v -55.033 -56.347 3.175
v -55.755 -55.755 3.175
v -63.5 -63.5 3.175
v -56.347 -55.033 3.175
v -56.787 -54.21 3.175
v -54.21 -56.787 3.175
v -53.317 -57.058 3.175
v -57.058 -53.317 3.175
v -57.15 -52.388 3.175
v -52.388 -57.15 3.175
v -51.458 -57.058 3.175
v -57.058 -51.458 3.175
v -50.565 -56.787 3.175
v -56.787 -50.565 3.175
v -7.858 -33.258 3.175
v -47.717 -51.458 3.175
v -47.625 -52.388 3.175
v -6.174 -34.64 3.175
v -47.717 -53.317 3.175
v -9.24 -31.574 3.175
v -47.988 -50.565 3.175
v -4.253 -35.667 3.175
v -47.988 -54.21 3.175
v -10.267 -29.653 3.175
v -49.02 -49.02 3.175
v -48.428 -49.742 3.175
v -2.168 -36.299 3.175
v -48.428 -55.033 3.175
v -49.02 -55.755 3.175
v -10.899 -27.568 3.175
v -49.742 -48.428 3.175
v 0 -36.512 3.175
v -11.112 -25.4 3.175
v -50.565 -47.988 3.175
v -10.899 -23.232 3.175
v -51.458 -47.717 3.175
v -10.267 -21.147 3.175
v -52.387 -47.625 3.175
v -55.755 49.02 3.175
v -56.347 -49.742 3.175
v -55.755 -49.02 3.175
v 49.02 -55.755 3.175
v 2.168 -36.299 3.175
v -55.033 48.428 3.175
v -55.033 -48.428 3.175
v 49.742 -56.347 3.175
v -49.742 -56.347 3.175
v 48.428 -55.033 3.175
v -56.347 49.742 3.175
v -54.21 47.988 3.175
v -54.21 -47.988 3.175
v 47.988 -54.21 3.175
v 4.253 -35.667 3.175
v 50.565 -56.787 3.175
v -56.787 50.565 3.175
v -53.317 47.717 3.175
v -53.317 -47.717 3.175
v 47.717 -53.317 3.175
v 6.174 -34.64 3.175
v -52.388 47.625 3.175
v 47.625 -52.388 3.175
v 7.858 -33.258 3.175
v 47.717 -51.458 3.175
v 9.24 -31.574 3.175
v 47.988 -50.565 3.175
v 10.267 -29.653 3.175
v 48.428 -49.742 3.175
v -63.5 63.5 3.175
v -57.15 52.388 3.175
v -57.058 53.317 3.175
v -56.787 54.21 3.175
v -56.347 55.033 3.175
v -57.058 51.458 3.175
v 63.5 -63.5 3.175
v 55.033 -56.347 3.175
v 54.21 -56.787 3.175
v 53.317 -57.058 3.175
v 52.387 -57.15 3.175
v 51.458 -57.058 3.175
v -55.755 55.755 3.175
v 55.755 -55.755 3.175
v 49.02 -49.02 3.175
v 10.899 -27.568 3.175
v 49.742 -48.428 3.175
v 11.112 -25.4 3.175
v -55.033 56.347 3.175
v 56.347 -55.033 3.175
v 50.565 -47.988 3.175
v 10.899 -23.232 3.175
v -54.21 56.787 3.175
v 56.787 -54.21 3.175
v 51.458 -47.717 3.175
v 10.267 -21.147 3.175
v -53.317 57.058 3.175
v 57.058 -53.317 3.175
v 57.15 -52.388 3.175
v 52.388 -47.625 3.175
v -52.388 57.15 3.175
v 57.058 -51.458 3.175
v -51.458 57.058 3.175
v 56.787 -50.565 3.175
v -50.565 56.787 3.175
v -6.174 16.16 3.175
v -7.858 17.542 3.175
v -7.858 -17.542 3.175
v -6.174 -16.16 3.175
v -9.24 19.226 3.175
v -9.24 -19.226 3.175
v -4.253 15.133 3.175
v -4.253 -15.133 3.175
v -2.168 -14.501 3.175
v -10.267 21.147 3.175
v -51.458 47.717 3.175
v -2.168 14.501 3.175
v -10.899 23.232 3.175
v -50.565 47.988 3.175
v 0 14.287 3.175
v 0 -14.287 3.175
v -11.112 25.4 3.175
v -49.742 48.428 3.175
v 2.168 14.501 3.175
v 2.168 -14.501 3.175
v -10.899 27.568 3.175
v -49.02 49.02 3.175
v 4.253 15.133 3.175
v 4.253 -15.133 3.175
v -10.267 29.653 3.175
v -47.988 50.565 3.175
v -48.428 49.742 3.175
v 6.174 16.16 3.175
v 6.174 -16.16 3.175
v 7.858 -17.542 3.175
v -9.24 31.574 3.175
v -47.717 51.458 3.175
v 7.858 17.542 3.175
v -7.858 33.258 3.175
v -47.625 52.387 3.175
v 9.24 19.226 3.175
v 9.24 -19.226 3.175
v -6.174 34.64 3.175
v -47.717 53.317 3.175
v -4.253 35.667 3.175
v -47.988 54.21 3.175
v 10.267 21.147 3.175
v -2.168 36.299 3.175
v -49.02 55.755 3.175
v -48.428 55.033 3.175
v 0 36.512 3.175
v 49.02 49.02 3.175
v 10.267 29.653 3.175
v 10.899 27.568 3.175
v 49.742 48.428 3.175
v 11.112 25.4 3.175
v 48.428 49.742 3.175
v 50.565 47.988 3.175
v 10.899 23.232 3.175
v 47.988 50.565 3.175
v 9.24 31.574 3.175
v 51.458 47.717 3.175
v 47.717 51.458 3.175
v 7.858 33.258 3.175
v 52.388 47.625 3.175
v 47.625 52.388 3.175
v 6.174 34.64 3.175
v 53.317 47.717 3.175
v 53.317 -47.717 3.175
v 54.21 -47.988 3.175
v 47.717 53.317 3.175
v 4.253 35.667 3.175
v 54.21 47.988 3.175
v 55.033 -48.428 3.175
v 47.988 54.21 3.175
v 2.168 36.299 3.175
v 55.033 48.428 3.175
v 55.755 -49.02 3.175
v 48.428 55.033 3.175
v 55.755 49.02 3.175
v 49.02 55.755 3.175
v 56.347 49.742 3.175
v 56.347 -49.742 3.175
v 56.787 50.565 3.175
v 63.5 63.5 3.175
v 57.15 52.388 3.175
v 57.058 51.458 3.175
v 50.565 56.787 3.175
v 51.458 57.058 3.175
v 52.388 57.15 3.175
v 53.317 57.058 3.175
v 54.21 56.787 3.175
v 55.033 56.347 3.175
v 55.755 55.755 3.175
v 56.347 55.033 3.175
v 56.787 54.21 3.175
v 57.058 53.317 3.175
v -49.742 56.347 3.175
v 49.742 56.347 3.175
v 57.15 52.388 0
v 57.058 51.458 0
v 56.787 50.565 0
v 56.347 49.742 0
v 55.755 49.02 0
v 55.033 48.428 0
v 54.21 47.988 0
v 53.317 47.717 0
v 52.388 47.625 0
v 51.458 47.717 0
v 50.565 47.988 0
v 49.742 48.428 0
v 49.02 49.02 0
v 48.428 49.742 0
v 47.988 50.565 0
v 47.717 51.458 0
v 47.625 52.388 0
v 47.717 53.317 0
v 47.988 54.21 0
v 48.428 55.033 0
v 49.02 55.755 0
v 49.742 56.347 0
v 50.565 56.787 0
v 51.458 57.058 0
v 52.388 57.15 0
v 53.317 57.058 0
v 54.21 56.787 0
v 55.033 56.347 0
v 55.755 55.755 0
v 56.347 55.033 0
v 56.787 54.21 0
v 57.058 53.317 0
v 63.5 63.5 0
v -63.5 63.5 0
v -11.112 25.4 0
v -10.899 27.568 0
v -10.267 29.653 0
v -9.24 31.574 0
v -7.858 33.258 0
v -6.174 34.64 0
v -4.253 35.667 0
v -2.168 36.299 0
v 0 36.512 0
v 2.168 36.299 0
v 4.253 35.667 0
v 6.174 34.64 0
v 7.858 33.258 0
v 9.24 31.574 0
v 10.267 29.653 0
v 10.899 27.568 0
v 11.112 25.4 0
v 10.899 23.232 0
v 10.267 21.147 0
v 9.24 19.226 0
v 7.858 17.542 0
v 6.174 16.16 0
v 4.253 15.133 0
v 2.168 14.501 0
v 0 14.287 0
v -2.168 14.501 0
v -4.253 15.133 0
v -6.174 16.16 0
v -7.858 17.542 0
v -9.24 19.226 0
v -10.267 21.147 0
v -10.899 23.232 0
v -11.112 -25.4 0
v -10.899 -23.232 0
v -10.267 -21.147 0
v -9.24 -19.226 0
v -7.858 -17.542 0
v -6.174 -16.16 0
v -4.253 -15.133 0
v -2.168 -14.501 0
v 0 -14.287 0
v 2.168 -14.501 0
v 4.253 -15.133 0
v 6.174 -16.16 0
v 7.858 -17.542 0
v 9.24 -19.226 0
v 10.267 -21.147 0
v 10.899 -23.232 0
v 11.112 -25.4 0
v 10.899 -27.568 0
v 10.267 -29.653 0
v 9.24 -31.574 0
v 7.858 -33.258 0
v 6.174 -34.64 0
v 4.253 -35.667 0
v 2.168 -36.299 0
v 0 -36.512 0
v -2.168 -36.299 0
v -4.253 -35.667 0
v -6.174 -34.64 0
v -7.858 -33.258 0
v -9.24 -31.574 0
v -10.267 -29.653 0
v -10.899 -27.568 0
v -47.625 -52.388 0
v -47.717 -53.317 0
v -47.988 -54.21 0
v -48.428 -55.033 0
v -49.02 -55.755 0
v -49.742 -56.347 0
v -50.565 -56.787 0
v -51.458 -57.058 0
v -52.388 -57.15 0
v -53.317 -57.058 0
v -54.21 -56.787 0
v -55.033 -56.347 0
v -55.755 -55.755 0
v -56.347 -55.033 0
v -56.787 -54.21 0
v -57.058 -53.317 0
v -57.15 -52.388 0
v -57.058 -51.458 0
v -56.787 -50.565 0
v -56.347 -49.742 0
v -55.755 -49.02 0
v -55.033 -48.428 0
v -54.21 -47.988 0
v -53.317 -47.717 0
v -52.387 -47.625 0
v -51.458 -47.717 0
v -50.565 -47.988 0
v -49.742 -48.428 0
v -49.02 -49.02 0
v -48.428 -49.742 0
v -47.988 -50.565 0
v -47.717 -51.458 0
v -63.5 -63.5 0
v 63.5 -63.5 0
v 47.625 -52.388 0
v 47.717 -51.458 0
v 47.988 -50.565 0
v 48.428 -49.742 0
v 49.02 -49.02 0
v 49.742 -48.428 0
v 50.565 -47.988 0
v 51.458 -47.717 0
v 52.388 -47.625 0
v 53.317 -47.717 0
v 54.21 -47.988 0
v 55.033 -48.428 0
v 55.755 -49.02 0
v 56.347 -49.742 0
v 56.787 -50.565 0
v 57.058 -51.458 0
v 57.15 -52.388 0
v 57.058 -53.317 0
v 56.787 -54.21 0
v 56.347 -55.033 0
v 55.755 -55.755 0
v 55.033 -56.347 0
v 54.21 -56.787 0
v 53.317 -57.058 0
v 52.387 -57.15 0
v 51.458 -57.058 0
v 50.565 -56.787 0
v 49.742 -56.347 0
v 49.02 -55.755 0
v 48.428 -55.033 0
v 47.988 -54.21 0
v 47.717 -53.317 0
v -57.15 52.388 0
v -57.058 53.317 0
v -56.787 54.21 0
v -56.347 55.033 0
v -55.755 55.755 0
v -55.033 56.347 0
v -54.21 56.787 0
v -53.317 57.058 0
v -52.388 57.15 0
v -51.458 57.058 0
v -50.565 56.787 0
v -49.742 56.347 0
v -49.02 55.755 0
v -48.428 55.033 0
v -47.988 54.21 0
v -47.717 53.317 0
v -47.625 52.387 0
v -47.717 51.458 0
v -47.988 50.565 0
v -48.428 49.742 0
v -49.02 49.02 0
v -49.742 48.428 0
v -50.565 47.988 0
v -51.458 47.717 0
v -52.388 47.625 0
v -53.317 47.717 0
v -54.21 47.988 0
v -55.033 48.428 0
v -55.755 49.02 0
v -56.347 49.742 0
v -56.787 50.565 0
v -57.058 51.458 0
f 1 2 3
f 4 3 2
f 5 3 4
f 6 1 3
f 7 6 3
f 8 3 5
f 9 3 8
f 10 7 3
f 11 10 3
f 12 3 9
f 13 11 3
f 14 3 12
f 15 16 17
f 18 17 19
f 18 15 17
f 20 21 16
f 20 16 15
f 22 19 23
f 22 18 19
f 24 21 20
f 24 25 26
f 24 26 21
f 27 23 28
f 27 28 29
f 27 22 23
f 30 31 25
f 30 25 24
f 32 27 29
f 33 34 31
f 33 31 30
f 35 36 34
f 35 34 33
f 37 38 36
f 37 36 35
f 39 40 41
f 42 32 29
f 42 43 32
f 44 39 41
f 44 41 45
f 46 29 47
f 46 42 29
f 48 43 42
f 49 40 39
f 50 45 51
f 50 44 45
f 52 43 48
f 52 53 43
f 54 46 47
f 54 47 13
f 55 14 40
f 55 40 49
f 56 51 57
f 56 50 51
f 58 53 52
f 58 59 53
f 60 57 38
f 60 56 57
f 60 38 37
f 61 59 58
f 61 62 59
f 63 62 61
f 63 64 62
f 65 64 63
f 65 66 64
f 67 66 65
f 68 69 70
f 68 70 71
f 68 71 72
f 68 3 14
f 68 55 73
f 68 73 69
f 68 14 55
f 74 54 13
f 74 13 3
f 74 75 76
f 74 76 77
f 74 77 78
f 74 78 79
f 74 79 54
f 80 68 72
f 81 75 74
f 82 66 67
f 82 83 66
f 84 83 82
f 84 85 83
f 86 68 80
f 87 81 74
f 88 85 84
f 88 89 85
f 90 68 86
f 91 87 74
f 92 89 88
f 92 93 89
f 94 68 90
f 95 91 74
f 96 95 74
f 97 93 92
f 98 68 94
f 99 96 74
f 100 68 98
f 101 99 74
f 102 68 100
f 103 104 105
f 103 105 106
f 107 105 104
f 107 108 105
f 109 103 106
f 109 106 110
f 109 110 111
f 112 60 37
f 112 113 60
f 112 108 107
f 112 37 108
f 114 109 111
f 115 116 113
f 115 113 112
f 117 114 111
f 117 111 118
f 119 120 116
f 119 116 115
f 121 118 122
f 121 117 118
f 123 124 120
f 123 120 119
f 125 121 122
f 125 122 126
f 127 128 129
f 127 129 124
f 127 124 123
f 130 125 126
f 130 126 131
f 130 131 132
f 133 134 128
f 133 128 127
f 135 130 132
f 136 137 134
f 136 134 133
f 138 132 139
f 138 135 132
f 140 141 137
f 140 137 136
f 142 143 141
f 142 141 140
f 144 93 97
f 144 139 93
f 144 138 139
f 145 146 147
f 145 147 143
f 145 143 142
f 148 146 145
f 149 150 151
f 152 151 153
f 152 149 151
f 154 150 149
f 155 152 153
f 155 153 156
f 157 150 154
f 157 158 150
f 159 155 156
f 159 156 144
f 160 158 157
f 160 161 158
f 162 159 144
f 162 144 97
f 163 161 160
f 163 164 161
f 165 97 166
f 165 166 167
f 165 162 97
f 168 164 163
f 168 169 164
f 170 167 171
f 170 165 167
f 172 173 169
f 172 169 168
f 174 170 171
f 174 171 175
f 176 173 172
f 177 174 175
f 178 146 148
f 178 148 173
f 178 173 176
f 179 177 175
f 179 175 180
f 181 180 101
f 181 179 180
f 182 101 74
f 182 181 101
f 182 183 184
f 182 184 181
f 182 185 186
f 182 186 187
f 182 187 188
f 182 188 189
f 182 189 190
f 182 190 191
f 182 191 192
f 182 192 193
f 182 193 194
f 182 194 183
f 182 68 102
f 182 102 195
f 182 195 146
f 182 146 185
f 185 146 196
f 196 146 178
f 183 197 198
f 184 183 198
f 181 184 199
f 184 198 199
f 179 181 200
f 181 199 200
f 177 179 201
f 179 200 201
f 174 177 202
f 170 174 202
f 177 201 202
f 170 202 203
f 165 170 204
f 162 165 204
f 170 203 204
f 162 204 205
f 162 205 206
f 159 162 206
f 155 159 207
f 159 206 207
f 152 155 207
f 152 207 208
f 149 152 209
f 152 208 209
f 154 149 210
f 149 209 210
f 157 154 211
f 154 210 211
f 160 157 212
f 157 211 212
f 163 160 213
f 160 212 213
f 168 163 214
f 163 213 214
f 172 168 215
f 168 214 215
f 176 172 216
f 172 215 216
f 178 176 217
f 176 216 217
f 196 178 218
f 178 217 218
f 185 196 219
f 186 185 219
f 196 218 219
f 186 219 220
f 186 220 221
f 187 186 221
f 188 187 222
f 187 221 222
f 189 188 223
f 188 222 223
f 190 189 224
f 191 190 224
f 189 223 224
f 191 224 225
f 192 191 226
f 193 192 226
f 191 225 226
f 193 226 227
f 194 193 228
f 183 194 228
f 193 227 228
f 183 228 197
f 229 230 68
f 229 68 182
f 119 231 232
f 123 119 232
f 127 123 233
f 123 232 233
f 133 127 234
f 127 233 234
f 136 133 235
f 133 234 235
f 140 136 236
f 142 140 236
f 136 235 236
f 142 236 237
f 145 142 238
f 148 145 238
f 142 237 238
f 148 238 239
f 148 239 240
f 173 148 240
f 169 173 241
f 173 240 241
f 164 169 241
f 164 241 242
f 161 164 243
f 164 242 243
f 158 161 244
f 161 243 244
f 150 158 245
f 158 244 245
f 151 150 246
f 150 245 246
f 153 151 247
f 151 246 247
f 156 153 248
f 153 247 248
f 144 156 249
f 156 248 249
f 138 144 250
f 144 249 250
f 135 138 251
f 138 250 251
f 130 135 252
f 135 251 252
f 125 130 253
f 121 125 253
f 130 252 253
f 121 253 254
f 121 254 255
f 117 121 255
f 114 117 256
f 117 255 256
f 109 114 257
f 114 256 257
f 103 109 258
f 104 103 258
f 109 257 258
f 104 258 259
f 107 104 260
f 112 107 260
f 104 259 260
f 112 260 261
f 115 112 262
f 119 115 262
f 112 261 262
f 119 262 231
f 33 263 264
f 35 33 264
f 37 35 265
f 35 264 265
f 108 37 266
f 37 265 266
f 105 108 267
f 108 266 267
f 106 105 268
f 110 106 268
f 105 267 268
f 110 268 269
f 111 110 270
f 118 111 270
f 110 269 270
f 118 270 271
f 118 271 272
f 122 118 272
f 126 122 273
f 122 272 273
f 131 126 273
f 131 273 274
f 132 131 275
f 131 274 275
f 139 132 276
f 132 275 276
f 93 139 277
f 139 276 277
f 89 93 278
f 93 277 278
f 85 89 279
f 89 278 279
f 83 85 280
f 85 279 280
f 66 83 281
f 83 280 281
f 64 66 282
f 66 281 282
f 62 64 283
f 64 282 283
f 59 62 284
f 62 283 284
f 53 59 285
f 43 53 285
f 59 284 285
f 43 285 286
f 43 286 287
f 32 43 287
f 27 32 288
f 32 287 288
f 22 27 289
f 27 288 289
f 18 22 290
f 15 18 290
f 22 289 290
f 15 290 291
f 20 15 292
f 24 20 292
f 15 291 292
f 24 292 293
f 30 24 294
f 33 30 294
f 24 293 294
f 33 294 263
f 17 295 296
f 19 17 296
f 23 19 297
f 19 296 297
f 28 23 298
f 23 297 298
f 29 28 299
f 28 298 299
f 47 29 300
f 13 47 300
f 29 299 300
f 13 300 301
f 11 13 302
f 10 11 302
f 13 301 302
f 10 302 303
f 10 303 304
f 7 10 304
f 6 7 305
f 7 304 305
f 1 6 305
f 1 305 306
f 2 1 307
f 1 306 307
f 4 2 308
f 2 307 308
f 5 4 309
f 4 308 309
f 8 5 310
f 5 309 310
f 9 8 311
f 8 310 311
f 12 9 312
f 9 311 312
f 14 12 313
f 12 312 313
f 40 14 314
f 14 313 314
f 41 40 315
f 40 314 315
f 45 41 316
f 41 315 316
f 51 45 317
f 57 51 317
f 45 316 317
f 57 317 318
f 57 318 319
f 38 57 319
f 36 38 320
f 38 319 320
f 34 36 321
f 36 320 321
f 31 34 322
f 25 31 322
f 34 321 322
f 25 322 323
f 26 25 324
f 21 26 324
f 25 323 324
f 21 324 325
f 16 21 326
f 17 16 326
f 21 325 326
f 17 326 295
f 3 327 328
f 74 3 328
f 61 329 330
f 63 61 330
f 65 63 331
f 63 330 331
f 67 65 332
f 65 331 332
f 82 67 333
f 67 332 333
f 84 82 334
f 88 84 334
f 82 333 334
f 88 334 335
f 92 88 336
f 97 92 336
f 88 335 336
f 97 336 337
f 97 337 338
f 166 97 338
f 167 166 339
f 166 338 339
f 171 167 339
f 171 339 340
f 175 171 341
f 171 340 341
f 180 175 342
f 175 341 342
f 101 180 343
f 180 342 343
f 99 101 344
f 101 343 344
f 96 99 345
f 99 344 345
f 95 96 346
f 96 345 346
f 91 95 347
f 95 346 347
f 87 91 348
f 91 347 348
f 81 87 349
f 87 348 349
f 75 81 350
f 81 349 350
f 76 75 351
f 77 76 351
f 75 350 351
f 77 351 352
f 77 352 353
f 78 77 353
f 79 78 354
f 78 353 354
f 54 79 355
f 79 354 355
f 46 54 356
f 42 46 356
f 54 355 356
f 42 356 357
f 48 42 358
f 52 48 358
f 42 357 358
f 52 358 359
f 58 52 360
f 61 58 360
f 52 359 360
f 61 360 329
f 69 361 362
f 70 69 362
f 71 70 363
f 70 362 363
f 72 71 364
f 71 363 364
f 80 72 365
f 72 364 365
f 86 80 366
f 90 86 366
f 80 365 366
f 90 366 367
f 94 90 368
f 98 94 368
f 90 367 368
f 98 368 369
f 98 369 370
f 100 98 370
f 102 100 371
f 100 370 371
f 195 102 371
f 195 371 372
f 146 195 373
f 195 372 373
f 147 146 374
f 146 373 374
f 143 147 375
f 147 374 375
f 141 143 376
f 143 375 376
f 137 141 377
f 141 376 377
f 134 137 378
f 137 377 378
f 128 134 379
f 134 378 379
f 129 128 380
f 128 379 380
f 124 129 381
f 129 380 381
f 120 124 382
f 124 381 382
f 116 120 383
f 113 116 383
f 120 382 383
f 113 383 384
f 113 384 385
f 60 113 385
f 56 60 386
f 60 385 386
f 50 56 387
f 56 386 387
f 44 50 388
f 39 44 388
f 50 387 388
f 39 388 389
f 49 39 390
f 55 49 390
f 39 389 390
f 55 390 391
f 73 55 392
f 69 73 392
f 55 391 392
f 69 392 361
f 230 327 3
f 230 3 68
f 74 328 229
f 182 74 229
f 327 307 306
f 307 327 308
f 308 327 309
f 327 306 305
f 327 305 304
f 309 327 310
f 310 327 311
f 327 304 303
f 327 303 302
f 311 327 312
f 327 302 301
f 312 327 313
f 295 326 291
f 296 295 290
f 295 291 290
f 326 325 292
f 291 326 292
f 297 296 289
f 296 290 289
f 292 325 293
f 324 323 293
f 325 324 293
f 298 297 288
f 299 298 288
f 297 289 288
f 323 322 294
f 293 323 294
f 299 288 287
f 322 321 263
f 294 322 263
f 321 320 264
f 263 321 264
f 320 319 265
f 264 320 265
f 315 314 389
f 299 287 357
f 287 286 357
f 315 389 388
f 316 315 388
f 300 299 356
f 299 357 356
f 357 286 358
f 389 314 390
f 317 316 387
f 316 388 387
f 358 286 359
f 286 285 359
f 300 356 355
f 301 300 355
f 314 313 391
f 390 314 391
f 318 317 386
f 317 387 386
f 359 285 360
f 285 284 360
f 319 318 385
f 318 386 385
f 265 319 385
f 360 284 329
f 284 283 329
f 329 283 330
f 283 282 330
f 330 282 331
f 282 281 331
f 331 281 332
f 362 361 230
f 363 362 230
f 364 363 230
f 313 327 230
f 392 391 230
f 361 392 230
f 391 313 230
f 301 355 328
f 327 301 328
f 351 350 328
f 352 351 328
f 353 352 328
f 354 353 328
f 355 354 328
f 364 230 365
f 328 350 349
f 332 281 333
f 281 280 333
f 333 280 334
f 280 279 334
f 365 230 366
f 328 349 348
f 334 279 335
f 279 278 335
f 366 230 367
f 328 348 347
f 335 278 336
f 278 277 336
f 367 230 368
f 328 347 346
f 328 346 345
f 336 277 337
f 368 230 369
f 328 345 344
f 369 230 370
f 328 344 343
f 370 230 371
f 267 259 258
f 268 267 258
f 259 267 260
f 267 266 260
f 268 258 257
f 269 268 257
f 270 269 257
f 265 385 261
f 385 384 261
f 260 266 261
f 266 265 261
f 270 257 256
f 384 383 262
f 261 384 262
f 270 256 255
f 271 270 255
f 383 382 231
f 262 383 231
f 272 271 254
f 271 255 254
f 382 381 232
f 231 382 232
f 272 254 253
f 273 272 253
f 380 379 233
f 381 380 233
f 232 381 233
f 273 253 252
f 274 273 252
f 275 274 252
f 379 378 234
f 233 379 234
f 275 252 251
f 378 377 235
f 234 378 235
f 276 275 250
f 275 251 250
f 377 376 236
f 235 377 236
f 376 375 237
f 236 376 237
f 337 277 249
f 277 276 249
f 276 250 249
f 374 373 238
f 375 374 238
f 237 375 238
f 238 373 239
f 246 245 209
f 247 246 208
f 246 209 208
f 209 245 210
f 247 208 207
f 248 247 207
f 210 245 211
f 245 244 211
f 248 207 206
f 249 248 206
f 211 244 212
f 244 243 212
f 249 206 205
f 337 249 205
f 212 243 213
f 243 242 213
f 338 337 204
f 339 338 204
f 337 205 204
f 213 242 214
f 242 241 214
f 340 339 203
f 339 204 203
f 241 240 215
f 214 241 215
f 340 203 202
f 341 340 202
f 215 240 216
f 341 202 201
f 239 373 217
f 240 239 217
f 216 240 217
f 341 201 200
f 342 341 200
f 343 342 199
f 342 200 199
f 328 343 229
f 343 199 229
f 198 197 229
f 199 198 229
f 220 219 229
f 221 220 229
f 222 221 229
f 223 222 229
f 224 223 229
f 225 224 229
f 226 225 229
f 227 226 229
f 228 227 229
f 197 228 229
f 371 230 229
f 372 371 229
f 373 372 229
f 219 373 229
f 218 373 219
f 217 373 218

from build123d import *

# Parameters (mm, degrees)
SKETCH1_W           = 127
SKETCH1_H           = 127
BOSS_EXTRUDE1_DEPTH = 3.175
SKETCH2_R           = 11.1125
CUT_EXTRUDE1_DEPTH  = 3.175
SKETCH4_R           = 4.7625
CUT_EXTRUDE3_DEPTH  = 3.175


with BuildPart() as part:
    # Sketch1 → Boss-Extrude1 (new body)
    with BuildSketch(Plane.XY):
        Rectangle(SKETCH1_W, SKETCH1_H)
    extrude(amount=BOSS_EXTRUDE1_DEPTH)

    # Sketch2 → Cut-Extrude1 (cut)
    with BuildSketch(Plane(origin=(0, 0, 0), x_dir=(-1, 0, 0), z_dir=(0, 0, -1))):
        with Locations((0, 25.4)):
            Circle(SKETCH2_R)
        with Locations((0, -25.4)):
            Circle(SKETCH2_R)
    extrude(amount=-CUT_EXTRUDE1_DEPTH, mode=Mode.SUBTRACT)

    # Sketch4 → Cut-Extrude3 (cut)
    with BuildSketch(Plane(origin=(0, 0, 0), x_dir=(-1, 0, 0), z_dir=(0, 0, -1))):
        with Locations((52.3875, 52.3875)):
            Circle(SKETCH4_R)
        with Locations(Location((52.3875, -52.3875, 0), (0, 0, 180))):
            Circle(SKETCH4_R)
        with Locations(Location((-52.3875, 52.3875, 0), (0, 0, 180))):
            Circle(SKETCH4_R)
        with Locations((-52.3875, -52.3875)):
            Circle(SKETCH4_R)
    extrude(amount=-CUT_EXTRUDE3_DEPTH, mode=Mode.SUBTRACT)


solid = part.part
